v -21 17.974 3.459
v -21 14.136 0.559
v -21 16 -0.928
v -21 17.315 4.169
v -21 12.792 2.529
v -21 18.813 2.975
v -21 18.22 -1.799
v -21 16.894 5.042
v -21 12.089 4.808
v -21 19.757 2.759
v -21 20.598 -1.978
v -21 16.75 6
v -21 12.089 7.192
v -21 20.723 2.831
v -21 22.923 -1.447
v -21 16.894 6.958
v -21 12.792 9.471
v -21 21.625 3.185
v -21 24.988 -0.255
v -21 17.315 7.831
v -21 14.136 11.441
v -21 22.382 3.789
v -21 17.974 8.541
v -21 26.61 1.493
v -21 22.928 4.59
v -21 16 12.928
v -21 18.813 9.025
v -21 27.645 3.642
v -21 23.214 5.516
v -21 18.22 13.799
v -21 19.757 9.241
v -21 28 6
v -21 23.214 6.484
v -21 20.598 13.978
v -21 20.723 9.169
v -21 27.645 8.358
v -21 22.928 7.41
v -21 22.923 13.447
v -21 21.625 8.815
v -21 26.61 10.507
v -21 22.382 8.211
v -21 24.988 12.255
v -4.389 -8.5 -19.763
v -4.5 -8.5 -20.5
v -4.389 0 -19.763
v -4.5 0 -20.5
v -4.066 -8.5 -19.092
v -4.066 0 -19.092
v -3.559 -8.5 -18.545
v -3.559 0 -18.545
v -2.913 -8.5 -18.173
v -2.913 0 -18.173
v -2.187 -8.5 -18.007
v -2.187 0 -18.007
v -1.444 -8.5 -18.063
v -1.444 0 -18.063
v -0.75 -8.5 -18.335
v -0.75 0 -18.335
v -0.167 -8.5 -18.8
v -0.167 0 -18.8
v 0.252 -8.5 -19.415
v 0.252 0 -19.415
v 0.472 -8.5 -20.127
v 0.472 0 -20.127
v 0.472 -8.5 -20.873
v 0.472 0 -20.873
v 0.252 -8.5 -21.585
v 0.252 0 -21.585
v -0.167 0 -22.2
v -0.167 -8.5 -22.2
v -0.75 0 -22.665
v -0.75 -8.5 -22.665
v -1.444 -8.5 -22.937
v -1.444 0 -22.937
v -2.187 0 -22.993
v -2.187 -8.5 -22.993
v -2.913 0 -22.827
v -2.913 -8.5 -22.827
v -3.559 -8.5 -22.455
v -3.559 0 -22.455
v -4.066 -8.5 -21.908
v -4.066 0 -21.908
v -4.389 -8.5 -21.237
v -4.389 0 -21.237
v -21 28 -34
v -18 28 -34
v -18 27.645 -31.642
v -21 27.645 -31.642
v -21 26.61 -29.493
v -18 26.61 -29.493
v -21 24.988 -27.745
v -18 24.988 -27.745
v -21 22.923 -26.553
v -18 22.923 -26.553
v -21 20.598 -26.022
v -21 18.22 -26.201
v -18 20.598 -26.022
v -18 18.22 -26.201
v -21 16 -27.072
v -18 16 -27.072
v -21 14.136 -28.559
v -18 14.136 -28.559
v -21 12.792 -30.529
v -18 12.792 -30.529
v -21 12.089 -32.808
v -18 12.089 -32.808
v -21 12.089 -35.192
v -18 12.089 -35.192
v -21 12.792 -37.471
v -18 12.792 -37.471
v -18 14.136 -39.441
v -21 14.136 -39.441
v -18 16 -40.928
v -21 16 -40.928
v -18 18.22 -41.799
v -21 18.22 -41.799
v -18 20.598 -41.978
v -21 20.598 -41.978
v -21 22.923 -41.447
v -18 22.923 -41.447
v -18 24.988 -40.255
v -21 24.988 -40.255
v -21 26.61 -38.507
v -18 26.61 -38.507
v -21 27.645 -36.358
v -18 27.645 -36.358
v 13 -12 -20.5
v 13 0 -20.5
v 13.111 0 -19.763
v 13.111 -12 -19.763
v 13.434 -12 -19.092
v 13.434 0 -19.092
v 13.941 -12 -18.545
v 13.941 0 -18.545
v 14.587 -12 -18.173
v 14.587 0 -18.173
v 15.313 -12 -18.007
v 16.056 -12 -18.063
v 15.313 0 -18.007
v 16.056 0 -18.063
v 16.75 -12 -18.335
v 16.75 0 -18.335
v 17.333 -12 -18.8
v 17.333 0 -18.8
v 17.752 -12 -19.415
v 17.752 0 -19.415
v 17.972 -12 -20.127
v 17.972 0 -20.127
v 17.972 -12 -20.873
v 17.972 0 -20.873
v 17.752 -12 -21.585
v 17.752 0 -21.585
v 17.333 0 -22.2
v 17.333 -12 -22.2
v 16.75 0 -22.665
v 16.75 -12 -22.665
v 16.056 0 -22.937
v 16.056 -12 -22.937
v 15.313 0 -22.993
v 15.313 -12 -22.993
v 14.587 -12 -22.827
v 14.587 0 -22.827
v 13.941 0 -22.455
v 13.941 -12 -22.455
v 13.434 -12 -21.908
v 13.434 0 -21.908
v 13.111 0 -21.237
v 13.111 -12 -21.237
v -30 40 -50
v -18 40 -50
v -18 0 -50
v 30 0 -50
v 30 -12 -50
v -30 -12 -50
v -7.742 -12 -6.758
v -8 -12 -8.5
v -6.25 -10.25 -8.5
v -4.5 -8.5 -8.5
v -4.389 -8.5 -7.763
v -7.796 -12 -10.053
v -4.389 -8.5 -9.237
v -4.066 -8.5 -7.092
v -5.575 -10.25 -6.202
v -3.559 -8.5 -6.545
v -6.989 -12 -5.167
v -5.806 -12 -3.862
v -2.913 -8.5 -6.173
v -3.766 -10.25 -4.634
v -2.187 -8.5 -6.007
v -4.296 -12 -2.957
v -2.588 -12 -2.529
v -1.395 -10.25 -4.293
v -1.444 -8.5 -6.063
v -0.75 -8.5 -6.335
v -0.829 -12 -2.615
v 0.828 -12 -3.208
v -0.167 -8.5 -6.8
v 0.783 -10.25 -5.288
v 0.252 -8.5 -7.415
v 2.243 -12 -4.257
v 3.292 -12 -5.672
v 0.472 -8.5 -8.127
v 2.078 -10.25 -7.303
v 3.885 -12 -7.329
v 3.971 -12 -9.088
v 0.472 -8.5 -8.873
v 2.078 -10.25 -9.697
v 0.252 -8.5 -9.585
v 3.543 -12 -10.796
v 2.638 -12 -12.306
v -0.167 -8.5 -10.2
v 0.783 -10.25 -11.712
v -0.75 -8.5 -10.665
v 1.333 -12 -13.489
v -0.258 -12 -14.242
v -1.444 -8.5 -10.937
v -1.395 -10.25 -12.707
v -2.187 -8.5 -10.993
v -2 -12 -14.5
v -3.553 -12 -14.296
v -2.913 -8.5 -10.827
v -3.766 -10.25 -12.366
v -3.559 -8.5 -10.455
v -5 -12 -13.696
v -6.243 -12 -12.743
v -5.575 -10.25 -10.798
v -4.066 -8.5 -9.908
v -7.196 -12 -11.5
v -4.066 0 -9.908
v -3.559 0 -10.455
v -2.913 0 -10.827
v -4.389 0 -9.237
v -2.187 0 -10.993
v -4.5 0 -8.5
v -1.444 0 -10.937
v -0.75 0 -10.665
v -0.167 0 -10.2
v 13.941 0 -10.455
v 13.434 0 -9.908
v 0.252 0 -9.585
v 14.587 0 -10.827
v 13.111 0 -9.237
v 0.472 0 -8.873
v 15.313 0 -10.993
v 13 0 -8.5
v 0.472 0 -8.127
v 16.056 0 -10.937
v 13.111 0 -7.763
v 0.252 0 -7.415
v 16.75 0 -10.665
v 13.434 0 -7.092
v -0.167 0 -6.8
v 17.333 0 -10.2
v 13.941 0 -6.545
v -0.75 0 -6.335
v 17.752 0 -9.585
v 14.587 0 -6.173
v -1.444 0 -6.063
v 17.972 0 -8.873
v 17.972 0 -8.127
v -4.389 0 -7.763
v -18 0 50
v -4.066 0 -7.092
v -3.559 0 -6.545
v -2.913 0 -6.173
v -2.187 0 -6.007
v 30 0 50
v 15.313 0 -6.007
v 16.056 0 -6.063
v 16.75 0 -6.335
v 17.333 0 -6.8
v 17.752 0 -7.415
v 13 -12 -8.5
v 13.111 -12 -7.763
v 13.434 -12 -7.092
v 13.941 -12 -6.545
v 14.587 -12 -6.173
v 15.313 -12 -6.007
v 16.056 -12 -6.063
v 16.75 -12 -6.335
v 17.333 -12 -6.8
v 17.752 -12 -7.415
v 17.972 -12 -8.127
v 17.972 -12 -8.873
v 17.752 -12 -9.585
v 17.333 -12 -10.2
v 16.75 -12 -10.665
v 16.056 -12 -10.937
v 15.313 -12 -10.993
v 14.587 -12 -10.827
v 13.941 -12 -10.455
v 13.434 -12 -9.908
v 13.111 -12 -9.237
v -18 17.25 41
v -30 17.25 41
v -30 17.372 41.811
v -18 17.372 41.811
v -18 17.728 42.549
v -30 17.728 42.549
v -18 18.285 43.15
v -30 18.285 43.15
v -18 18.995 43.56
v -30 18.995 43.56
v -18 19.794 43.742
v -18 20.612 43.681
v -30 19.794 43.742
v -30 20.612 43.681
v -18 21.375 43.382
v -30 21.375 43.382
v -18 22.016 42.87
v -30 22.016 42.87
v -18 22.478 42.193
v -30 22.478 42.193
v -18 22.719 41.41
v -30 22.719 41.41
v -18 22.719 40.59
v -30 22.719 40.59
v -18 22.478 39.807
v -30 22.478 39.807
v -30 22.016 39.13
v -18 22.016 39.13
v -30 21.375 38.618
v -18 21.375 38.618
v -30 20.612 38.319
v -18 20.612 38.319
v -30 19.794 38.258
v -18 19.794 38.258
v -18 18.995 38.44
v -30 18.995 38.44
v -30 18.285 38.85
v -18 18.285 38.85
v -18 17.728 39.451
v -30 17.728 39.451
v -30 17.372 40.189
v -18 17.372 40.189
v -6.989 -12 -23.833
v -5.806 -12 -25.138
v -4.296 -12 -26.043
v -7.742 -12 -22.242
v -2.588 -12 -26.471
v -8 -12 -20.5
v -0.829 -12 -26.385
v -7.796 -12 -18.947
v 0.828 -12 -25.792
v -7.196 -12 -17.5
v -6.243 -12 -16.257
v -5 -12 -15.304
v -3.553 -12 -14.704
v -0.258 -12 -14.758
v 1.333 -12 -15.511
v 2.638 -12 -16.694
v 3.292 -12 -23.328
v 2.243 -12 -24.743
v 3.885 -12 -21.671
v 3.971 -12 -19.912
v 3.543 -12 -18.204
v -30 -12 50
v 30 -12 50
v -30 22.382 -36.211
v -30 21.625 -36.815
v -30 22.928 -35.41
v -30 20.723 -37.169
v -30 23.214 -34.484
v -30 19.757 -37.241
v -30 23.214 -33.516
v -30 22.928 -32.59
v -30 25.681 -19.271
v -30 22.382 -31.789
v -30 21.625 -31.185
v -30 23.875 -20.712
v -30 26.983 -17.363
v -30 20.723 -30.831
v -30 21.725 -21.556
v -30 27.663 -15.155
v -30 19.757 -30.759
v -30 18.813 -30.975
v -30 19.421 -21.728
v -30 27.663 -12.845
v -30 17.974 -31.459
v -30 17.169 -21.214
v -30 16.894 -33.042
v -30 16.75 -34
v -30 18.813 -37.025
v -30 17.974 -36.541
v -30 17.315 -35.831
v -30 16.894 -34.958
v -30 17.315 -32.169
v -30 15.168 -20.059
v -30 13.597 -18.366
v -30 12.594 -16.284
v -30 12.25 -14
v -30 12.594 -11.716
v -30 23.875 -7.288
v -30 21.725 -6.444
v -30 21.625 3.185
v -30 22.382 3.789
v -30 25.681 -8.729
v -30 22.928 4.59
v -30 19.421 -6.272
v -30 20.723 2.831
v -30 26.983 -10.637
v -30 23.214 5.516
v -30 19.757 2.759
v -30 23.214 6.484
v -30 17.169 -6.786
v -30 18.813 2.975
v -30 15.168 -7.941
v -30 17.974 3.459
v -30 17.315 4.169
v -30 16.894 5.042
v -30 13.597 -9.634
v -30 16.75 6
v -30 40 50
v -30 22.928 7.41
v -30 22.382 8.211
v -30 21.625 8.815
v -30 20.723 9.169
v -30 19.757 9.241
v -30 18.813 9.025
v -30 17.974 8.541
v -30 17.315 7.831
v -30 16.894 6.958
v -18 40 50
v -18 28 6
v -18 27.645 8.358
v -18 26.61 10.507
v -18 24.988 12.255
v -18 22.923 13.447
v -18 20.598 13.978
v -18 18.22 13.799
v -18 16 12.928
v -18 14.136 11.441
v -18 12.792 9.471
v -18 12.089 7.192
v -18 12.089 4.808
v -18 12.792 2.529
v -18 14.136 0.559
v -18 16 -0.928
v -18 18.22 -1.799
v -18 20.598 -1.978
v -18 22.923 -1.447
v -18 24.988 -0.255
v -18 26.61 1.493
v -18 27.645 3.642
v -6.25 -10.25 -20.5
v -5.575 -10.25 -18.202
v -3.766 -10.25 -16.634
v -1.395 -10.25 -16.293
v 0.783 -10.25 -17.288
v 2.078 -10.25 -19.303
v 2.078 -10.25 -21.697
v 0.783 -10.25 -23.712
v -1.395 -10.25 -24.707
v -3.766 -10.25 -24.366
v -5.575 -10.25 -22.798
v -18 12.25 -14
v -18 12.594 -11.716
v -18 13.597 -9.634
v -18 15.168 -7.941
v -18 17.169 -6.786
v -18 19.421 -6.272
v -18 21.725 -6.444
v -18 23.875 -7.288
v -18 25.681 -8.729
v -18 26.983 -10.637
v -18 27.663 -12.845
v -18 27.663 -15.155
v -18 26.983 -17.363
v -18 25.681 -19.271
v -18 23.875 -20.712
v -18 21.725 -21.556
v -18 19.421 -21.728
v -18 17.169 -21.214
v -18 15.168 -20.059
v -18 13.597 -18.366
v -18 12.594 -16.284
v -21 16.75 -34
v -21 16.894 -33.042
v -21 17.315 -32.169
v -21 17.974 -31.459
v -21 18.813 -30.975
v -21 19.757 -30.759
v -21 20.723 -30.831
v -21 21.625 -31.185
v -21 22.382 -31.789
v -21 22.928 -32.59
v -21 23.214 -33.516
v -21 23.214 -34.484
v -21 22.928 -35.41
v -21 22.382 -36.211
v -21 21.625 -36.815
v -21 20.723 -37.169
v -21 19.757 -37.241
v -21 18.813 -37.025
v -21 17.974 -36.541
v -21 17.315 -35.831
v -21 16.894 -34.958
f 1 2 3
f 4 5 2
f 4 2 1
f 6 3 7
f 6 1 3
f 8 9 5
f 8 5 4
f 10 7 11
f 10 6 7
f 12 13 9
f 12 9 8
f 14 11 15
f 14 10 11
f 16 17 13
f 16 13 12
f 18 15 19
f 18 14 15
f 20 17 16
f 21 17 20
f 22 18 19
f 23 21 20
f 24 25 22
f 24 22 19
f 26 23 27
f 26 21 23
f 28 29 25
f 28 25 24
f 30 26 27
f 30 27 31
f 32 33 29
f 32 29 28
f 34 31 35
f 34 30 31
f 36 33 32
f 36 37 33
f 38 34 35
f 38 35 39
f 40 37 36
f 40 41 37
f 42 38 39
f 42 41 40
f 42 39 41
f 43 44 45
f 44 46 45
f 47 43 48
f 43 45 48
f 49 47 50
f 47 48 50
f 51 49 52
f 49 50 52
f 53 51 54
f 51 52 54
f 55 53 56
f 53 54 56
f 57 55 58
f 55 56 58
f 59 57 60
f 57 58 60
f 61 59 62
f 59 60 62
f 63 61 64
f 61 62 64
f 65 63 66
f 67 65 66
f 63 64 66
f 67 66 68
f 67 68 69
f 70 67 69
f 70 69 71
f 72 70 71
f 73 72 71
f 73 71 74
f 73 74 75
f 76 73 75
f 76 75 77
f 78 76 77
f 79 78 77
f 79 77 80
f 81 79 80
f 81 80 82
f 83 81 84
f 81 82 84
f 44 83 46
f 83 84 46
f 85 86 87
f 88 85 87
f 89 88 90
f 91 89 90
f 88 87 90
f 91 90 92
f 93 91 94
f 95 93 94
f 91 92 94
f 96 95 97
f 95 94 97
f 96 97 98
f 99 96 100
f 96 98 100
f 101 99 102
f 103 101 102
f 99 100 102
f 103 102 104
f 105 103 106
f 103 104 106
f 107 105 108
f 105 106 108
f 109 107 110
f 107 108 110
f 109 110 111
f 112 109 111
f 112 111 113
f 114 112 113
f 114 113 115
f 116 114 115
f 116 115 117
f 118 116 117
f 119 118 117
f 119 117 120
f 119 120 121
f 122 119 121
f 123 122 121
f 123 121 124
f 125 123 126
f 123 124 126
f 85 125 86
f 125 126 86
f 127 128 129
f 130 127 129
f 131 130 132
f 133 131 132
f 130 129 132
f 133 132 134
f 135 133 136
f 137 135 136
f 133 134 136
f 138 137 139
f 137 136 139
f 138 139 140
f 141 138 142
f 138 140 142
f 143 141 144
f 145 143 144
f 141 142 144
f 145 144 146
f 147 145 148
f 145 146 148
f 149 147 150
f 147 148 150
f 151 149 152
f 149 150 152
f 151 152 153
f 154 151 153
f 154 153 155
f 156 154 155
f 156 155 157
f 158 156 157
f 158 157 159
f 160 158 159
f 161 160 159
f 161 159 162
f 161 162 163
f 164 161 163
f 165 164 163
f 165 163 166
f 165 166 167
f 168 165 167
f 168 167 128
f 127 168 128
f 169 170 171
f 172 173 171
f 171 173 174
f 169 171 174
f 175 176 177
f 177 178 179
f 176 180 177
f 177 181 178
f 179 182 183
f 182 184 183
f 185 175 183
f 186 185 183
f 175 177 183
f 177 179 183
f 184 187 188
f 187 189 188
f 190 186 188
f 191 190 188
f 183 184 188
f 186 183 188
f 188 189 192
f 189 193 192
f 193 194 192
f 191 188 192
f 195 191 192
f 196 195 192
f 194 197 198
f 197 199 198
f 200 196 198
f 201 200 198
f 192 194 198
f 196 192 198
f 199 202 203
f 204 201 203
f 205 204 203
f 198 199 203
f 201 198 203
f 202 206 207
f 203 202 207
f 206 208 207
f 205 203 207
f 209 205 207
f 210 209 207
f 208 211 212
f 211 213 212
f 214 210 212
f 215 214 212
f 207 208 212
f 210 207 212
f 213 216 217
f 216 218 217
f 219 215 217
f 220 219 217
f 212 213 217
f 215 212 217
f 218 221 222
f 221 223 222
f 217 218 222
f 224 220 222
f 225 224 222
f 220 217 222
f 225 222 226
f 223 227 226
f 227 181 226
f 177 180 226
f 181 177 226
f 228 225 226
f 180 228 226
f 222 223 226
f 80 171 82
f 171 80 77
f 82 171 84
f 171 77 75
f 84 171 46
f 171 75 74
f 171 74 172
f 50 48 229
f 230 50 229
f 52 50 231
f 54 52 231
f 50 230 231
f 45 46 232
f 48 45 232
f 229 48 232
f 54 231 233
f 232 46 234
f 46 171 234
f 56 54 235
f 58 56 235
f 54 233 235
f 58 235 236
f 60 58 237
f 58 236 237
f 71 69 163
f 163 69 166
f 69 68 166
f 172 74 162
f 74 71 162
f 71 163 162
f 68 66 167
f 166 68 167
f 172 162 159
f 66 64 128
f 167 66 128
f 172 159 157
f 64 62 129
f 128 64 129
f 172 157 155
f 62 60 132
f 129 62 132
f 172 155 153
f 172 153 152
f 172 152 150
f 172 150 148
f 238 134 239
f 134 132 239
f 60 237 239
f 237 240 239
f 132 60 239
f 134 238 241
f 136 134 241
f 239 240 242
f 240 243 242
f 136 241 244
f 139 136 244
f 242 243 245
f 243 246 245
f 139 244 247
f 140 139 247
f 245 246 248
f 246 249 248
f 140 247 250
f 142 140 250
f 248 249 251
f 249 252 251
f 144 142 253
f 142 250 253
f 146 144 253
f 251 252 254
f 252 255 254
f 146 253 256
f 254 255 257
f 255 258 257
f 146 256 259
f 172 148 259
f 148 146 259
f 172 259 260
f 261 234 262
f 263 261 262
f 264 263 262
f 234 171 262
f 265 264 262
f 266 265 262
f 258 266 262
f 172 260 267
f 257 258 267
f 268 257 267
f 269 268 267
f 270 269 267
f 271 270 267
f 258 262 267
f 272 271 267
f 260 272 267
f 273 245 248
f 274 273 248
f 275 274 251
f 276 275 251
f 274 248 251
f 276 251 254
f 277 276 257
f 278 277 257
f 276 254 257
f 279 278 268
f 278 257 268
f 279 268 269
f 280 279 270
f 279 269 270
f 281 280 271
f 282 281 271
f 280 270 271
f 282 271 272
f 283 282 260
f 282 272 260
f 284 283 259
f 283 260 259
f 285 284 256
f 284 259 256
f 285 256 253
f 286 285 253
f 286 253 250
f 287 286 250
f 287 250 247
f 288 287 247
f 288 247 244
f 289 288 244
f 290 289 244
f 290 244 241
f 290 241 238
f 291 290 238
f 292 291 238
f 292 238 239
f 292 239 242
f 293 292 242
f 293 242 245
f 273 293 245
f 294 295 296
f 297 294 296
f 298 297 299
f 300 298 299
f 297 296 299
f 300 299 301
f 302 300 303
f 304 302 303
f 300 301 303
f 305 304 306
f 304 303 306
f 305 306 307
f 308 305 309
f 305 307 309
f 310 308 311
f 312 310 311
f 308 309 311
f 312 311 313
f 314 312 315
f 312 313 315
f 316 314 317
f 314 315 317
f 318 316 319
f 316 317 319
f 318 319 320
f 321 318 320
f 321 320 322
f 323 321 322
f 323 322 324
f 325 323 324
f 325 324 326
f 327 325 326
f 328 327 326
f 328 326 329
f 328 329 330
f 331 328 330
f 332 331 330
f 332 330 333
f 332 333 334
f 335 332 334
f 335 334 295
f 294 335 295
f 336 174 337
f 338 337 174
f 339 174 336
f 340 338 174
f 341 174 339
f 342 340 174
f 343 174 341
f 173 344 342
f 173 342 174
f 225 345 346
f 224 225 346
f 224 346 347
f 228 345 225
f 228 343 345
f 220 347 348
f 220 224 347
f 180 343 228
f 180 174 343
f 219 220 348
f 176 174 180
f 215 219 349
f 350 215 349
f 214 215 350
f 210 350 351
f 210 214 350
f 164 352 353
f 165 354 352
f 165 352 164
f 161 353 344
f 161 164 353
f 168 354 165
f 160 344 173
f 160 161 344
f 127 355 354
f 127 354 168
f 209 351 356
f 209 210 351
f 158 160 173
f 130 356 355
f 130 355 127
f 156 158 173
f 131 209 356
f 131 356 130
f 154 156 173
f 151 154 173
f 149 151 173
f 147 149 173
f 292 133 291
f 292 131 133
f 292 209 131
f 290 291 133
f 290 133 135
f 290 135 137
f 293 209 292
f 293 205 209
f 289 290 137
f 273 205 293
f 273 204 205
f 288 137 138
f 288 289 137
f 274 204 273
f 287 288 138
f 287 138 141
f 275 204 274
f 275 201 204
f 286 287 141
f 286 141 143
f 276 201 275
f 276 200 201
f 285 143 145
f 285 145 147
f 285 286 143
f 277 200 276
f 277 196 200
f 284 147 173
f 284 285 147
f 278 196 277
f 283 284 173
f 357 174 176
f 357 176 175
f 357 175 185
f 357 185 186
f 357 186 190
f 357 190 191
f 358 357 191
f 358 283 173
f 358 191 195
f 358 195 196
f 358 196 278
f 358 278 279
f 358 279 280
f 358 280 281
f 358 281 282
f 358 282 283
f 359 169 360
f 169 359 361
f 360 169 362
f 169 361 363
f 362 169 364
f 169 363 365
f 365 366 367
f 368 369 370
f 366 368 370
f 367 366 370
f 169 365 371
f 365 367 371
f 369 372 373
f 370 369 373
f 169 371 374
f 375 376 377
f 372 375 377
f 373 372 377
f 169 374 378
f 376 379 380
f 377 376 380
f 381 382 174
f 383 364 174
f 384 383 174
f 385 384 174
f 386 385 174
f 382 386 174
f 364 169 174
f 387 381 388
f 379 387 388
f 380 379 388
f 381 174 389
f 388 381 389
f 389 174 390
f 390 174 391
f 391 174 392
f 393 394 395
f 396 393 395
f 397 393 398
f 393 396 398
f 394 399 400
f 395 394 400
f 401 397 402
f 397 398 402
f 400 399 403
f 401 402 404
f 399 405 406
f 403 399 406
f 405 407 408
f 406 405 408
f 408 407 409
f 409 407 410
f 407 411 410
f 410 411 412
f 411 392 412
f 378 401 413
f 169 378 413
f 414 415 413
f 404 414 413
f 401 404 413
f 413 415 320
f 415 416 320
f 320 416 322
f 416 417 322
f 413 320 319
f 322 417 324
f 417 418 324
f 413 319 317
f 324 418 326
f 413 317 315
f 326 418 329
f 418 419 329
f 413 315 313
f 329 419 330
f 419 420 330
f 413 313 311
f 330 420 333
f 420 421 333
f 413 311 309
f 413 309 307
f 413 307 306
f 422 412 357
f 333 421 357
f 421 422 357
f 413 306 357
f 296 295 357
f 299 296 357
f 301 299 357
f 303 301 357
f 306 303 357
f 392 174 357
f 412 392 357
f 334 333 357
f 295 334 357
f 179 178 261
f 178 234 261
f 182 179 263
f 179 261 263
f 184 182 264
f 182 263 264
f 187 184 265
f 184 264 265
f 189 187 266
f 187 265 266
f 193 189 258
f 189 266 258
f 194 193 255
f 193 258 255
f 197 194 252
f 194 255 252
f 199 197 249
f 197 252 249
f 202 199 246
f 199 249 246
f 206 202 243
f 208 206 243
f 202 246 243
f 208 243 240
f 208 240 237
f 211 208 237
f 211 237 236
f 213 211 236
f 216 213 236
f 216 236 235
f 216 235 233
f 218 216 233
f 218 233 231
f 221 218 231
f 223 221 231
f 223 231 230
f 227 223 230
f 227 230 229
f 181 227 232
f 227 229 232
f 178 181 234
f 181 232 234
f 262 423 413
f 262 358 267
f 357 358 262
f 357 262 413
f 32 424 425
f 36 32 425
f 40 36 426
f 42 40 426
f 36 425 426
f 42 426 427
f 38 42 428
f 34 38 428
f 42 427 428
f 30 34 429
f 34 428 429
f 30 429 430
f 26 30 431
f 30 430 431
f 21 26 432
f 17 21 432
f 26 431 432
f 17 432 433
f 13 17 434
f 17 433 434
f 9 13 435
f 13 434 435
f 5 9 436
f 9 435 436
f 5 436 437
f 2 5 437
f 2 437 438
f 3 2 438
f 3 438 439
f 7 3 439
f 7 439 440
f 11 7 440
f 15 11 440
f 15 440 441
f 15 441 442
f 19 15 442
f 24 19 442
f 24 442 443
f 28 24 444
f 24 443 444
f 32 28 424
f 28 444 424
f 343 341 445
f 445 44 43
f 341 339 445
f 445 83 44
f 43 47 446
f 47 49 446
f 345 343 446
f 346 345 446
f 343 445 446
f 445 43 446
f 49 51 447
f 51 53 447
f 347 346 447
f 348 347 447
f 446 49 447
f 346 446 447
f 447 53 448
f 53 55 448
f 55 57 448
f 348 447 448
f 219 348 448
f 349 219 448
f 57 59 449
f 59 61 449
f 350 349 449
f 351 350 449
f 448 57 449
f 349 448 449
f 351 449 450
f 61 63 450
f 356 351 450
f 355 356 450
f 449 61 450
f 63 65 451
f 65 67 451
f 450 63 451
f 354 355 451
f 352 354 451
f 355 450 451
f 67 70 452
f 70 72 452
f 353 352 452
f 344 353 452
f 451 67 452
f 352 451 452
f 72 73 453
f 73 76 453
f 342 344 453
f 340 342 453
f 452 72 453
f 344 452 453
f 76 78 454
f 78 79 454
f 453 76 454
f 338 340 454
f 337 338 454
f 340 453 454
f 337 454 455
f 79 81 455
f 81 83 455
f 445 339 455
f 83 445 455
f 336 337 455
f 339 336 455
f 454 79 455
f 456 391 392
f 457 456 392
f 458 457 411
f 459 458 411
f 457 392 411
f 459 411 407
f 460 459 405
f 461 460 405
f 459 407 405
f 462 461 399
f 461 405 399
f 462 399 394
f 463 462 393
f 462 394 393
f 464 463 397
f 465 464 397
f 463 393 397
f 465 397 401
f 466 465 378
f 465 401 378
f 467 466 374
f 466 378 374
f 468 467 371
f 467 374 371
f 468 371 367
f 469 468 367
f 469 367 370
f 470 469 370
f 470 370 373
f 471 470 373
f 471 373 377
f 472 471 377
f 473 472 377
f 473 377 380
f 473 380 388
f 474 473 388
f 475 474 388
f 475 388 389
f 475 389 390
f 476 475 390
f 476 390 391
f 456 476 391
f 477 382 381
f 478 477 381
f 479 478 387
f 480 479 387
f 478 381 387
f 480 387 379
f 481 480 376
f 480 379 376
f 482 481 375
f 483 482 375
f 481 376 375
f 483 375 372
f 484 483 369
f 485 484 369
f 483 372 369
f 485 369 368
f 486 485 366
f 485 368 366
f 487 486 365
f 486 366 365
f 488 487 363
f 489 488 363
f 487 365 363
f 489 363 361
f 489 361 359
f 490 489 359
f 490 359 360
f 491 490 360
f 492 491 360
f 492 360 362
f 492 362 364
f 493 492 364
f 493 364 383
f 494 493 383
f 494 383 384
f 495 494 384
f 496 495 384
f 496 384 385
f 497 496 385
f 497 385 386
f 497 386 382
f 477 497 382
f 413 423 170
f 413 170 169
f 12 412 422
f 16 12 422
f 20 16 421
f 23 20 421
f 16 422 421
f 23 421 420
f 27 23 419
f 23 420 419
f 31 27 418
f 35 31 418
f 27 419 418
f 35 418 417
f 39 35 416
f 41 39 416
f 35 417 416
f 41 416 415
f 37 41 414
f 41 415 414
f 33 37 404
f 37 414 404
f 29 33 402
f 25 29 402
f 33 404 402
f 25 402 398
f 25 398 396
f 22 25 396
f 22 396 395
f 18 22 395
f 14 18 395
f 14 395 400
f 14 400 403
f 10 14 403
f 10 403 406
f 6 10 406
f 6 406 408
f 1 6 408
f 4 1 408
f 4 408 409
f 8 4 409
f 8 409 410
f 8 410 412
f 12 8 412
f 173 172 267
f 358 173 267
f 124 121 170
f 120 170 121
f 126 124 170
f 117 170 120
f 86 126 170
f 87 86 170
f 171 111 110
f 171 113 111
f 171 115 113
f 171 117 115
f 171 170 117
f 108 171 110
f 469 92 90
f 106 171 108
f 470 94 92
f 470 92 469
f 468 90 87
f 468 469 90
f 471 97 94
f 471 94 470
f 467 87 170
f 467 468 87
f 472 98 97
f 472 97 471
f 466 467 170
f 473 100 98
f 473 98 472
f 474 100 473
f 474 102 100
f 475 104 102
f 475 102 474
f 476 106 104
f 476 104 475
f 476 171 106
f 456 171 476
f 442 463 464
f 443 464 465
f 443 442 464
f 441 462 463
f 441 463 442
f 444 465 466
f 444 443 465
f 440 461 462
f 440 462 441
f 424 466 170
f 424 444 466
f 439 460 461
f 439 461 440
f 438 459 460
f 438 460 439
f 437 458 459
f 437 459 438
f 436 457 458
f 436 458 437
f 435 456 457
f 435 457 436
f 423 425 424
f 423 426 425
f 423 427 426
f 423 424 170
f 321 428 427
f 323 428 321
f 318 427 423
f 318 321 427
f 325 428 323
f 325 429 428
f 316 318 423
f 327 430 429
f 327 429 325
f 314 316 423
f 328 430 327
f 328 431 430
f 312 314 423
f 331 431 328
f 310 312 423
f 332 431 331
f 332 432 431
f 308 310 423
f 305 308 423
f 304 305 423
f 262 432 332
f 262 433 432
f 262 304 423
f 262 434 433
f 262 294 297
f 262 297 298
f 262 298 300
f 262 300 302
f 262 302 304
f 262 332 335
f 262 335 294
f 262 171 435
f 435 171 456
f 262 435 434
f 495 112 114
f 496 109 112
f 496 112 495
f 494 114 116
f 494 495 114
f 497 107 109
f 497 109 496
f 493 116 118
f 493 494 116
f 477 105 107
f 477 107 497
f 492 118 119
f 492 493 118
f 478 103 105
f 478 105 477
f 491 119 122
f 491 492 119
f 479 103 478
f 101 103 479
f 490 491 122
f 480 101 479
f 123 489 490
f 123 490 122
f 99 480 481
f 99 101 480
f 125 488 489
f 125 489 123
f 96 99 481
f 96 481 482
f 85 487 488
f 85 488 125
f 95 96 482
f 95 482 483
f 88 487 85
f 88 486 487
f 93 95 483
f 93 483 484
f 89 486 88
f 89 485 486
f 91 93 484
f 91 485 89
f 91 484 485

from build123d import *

# Parameters (mm, degrees)
F0_W            = 60
F0_H            = 100
F1_DEPTH        = 10
F2_W            = 12
F2_H            = 100
F3_DEPTH        = 40
F5_W            = 60
F5_H            = 100
F6_DEPTH        = 12
F7_W            = 12
F7_H            = 100
F8_DEPTH        = 40
F10_D           = 5
F10_CSINK_D     = 12
F10_CSINK_ANGLE = 90
F12_D           = 5
F13_R           = 8
F14_DEPTH       = 3
F16_D           = 6.5
F18_D           = 6.5
F20_D           = 5.5
F22_D           = 15.5


with BuildPart() as f1:
    # F0 (on Front) → F1 (new body)
    with BuildSketch(Plane.XZ):
        Rectangle(F0_W, F0_H)
    extrude(amount=F1_DEPTH)

    # F2 (on face) → F3 (join)
    with BuildSketch(Plane.XZ.offset(10)):
        with Locations((-24, 0)):
            Rectangle(F2_W, F2_H)
    extrude(amount=F3_DEPTH)


with BuildPart() as f6:
    # F5 (on Front) → F6 (new body)
    with BuildSketch(Plane.XZ):
        Rectangle(F5_W, F5_H)
    extrude(amount=F6_DEPTH)

    # F7 (on face) → F8 (join)
    with BuildSketch(Plane(origin=(0, 0, 0), x_dir=(-1, 0, 0), z_dir=(0, 1, 0))):
        with Locations((24, 0)):
            Rectangle(F7_W, F7_H)
    extrude(amount=F8_DEPTH)

    # F10 (through all)
    with Locations(Plane.XZ.offset(12)):
        with Locations((-2, -8.5), (-2, -20.5)):
            CounterSinkHole(F10_D / 2, F10_CSINK_D / 2, counter_sink_angle=F10_CSINK_ANGLE)

    # F12 (through all)
    with Locations(Plane.XZ.offset(12)):
        with Locations((15.5, -8.5), (15.5, -20.5)):
            Hole(F12_D / 2)

    # F13 (on face) → F14 (cut)
    with BuildSketch(Plane.YZ.offset(-18)):
        with Locations((20, 6)):
            Circle(F13_R)
        with Locations((20, -34)):
            Circle(F13_R)
    extrude(amount=-F14_DEPTH, mode=Mode.SUBTRACT)

    # F16 (through all)
    with Locations(Plane.YZ.offset(-21)):
        with Locations((20, 6)):
            Hole(F16_D / 2)

    # F18 (through all)
    with Locations(Plane.YZ.offset(-21)):
        with Locations((20, -34)):
            Hole(F18_D / 2)

    # F20 (through all)
    with Locations(Plane.YZ.offset(-18)):
        with Locations((20, 41)):
            Hole(F20_D / 2)

    # F22 (through all)
    with Locations(Plane.YZ.offset(-18)):
        with Locations((20, -14)):
            Hole(F22_D / 2)


solid = f6.part
